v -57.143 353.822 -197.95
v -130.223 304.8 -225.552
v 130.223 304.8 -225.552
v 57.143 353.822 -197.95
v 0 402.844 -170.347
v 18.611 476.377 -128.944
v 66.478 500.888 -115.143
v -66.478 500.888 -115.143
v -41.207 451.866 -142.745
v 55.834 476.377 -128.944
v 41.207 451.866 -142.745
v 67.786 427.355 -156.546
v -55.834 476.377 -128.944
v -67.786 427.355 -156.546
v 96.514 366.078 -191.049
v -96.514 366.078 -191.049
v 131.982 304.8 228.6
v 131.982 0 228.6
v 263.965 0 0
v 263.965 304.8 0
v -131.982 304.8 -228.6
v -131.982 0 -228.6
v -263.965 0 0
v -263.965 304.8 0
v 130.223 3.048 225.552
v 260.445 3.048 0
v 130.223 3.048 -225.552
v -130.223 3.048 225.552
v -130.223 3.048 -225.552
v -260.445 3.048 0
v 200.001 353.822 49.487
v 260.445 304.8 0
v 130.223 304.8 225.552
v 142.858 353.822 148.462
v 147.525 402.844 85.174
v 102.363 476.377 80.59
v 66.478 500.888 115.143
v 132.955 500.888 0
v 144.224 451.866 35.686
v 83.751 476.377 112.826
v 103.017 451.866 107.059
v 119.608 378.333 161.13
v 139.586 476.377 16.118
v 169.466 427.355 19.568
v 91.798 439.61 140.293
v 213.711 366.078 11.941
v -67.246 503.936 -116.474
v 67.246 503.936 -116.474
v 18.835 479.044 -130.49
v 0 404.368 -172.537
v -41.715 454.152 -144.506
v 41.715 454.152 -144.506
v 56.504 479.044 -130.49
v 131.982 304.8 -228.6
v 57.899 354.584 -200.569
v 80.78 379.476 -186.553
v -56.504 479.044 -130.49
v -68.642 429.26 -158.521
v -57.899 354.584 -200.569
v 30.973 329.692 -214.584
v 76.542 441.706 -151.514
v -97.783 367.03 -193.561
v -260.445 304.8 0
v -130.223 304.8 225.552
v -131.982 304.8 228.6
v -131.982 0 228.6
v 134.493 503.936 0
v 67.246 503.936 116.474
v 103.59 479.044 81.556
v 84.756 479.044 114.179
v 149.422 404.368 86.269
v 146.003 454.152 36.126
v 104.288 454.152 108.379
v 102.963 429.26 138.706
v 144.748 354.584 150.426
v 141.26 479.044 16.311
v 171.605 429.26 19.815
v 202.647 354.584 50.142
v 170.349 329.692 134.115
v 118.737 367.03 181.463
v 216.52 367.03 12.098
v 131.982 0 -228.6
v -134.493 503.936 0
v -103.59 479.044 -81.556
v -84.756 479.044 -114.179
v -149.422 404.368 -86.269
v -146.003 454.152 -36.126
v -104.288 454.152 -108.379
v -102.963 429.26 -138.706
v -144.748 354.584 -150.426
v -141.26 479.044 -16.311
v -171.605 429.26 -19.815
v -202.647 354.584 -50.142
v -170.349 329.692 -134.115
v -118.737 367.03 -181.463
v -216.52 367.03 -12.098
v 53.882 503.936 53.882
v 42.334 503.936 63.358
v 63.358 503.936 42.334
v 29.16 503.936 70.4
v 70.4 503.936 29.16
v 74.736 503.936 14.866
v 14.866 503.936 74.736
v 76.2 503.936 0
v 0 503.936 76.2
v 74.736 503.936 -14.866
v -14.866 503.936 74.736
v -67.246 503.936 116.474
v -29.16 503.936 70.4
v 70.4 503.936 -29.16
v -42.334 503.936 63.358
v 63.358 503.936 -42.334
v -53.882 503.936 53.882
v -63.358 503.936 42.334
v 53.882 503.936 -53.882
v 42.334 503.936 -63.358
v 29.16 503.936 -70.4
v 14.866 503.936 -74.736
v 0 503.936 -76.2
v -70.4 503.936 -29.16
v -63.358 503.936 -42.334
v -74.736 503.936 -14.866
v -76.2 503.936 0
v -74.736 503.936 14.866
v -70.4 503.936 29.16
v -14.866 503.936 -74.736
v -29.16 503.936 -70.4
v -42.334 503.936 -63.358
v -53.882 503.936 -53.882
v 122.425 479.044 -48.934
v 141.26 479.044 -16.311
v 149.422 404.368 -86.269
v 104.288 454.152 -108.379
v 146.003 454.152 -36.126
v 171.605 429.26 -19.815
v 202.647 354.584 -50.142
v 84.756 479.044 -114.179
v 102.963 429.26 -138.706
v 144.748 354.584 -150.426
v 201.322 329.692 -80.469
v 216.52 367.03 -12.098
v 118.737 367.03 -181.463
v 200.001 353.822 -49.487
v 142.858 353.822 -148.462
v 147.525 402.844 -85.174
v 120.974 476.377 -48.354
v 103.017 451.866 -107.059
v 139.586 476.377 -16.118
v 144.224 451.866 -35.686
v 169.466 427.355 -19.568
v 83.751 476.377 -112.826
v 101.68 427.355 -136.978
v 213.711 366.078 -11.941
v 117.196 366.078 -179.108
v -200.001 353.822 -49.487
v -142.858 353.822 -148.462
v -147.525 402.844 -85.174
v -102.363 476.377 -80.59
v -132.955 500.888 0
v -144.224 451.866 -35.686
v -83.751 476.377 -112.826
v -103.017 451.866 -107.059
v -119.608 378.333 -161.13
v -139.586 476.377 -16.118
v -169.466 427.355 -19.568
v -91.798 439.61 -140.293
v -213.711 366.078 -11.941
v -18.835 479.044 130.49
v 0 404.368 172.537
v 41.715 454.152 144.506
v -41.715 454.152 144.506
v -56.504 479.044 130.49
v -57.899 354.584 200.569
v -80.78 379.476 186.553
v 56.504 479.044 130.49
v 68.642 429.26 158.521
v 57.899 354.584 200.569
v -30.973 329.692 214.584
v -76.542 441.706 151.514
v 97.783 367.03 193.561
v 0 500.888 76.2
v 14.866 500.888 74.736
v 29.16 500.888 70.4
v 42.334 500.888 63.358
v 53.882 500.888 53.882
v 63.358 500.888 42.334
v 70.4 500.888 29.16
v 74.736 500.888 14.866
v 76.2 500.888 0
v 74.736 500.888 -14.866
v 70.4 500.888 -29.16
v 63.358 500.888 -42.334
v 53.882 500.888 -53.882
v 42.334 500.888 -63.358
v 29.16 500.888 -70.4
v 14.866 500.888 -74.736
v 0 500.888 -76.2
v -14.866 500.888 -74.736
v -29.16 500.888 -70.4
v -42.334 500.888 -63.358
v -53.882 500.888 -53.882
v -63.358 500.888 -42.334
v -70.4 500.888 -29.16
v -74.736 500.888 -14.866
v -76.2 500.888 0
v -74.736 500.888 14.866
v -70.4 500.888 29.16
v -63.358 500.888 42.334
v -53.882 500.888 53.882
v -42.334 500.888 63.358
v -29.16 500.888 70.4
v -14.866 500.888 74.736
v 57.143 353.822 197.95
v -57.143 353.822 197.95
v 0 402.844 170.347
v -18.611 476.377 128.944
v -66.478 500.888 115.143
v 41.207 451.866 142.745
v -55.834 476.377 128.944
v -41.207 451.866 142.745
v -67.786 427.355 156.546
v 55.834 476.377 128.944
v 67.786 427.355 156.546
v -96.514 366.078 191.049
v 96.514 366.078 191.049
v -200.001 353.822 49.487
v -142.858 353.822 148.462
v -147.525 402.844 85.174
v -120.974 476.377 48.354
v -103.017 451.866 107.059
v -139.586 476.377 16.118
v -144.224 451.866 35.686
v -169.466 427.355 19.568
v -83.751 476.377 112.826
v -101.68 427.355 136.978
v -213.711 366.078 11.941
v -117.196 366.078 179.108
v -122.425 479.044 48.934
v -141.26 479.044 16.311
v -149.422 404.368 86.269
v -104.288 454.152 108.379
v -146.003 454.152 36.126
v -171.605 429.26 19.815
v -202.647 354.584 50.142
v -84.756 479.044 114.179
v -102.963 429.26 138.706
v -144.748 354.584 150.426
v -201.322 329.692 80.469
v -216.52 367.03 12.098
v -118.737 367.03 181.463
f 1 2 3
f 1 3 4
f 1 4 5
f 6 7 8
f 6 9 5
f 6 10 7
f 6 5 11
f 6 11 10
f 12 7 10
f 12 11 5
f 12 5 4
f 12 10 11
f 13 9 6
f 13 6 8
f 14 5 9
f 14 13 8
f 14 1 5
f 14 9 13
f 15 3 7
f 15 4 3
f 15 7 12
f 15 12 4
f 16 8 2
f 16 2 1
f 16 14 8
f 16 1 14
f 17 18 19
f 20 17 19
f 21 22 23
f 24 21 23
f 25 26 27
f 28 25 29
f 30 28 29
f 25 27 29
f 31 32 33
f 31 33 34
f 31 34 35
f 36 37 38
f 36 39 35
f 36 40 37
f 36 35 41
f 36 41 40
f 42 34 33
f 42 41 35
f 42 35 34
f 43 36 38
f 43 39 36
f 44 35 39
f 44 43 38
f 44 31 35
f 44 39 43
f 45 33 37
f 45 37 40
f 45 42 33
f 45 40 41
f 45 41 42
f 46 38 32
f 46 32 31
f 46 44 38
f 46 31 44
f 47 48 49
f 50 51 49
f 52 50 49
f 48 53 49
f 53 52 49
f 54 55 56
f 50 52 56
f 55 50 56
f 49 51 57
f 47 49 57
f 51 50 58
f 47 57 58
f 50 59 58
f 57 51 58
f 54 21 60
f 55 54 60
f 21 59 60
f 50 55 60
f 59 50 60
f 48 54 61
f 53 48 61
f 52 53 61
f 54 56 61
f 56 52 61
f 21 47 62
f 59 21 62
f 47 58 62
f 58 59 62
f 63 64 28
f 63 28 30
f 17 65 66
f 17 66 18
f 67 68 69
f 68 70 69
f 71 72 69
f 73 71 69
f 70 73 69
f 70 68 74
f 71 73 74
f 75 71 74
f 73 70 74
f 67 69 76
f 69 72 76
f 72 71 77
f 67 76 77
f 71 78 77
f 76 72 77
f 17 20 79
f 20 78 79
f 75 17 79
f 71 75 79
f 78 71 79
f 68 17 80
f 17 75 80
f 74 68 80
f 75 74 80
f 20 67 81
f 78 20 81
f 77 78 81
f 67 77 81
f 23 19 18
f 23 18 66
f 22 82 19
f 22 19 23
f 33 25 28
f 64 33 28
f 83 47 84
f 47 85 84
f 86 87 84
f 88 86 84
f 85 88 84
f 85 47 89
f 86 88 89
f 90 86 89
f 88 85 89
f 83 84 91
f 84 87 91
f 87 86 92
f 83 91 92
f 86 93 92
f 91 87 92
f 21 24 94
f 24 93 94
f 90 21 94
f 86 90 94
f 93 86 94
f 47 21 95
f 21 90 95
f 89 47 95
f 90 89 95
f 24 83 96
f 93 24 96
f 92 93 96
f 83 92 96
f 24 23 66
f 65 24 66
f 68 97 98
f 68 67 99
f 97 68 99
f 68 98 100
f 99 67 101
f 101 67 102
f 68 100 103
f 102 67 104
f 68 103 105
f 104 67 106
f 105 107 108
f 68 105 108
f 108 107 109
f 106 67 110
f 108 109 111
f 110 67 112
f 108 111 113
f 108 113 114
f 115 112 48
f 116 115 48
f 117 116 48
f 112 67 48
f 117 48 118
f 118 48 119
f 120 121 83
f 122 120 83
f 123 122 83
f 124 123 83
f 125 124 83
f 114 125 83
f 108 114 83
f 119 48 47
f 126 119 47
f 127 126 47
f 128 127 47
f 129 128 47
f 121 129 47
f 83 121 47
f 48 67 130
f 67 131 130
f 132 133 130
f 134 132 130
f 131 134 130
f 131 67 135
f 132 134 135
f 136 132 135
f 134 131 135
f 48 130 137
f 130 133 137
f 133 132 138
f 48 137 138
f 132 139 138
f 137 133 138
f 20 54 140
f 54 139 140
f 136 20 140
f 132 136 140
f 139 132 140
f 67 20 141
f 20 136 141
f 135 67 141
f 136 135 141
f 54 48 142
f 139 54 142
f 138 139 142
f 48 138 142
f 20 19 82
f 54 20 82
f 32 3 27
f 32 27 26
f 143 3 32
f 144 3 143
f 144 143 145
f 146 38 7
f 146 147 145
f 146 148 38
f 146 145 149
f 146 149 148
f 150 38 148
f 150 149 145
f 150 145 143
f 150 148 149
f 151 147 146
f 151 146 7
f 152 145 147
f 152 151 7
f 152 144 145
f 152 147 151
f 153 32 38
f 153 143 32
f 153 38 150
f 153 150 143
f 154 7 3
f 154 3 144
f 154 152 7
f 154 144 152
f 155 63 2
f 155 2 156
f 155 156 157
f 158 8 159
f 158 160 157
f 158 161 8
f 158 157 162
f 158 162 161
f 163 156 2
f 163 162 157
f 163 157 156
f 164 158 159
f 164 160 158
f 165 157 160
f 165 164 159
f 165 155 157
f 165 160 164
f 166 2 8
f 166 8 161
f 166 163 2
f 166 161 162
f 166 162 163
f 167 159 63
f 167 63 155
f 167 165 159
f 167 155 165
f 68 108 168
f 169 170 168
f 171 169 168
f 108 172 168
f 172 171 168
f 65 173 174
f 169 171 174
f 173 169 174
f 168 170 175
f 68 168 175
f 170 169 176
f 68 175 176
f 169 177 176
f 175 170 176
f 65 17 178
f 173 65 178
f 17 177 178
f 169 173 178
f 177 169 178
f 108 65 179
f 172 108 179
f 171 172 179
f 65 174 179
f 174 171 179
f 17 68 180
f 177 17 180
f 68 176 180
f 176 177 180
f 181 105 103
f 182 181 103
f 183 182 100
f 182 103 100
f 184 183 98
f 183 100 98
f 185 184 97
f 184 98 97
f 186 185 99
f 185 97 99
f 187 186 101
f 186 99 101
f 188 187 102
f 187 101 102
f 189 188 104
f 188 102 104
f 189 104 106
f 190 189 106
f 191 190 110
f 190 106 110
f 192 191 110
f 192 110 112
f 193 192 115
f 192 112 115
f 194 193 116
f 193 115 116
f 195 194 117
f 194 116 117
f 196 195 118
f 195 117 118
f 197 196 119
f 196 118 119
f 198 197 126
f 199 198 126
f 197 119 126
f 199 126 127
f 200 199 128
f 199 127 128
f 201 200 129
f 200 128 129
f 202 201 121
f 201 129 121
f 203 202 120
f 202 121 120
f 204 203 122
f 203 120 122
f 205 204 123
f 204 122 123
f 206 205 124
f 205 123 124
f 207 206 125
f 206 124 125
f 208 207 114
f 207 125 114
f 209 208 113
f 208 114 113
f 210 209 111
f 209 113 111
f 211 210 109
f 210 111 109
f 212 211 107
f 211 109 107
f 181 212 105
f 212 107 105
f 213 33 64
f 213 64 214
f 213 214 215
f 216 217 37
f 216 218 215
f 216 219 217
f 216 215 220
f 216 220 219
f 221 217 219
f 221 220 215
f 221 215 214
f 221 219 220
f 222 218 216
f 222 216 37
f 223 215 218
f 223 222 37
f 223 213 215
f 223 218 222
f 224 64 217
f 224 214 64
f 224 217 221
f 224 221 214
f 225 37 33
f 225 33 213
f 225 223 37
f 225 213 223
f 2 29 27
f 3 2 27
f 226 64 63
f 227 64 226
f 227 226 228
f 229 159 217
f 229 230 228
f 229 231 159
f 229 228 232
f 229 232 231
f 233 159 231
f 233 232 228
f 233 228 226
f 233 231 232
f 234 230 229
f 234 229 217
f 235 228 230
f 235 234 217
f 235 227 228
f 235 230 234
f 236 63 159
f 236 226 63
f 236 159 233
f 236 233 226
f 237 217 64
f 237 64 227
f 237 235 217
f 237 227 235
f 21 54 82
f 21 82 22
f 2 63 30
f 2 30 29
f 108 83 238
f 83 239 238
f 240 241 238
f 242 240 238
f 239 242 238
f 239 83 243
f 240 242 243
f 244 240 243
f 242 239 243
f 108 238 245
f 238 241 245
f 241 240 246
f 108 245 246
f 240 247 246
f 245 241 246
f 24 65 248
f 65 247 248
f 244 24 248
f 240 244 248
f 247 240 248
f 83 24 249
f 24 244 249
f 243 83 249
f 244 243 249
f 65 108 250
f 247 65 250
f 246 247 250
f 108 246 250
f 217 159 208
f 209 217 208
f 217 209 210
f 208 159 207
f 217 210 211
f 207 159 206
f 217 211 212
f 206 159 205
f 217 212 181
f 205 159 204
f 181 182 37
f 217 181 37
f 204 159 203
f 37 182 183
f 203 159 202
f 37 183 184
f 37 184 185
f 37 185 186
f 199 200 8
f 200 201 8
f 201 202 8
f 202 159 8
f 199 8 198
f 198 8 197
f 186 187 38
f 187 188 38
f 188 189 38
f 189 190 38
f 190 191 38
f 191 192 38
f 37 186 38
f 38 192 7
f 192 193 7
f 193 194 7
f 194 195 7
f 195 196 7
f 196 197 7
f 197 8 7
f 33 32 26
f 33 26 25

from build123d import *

# Parameters (mm, degrees)
BOSS_EXTRUDE2_DEPTH = 304.8
CUT_EXTRUDE1_DEPTH  = 304.8
BOSS_EXTRUDE3_DEPTH = 3.048
SKETCH11_R          = 76.2
CUT_EXTRUDE2_DEPTH  = 3.048
BOSS_EXTRUDE4_DEPTH = 3.048


with BuildPart() as part:
    # Sketch4 → Boss-Extrude2 (new body)
    with BuildSketch(Plane(origin=(0, 0, 0), x_dir=(1, 0, 0), z_dir=(0, 1, 0))):
        Polygon((263.964543073, 0), (131.982271537, 228.6), (-131.982271537, 228.6), (-263.964543073, 0), (-131.982271537, -228.6), (131.982271537, -228.6), align=None)
    extrude(amount=BOSS_EXTRUDE2_DEPTH)

    # Sketch5 → section 0 of loft1
    with BuildSketch(Plane(origin=(0, 503.936, 0), x_dir=(1, 0, 0), z_dir=(0, 1, 0)), mode=Mode.PRIVATE) as loft1_s0:
        with BuildLine():
            Line((134.493, 0), (67.2465, 116.474354631))
            Line((67.2465, 116.474354631), (-67.2465, 116.474354631))
            Line((-67.2465, 116.474354631), (-134.493, 0))
            Line((-134.493, 0), (-67.2465, -116.474354631))
            Line((-67.2465, -116.474354631), (67.2465, -116.474354631))
            Line((67.2465, -116.474354631), (134.493, 0))
        make_face()
    # loft up to a face of the part (loft1)
    loft([loft1_s0.sketch, part.faces().sort_by_distance((0, 304.8, 0))[0]])

    # Sketch7 → Cut-Extrude1 (cut)
    with BuildSketch(Plane(origin=(0, 0, 0), x_dir=(-1, 0, 0), z_dir=(0, -1, 0))):
        Polygon((-260.445015833, 0), (-130.222507916, -225.552), (130.222507916, -225.552), (260.445015833, 0), (130.222507916, 225.552), (-130.222507916, 225.552), align=None)
    extrude(amount=-CUT_EXTRUDE1_DEPTH, mode=Mode.SUBTRACT)

    # Sketch8 → section 0 of cut_loft2
    with BuildSketch(Plane(origin=(0, 503.936, 0), x_dir=(1, 0, 0), z_dir=(0, 1, 0)), mode=Mode.PRIVATE) as cut_loft2_s0:
        with BuildLine():
            Line((130.973472817, 0), (65.486736408, 113.426354681))
            Line((65.486736408, 113.426354681), (-65.486736408, 113.426354681))
            Line((-65.486736408, 113.426354681), (-130.973472817, 0))
            Line((-130.973472817, 0), (-65.486736408, -113.426354681))
            Line((-65.486736408, -113.426354681), (65.486736408, -113.426354681))
            Line((65.486736408, -113.426354681), (130.973472817, 0))
        make_face()
    # loft up to a face of the part (cut_loft2)
    loft([cut_loft2_s0.sketch, part.faces().sort_by_distance((0, 304.8, 0))[0]], mode=Mode.SUBTRACT)

    # Sketch10 → Boss-Extrude3 (add)
    with BuildSketch(Plane(origin=(0, 503.936, 0), x_dir=(1, 0, 0), z_dir=(0, 1, 0))):
        Polygon((134.493, 0), (67.2465, 116.474354631), (-67.2465, 116.474354631), (-134.493, 0), (-67.2465, -116.474354631), (67.2465, -116.474354631), align=None)
    extrude(amount=-BOSS_EXTRUDE3_DEPTH)

    # Sketch11 → Cut-Extrude2 (cut)
    with BuildSketch(Plane(origin=(0, 503.936, 0), x_dir=(1, 0, 0), z_dir=(0, 1, 0))):
        with Locations(Location((0, 0, 0), (0, 0, 270))):
            Circle(SKETCH11_R)
    extrude(amount=-CUT_EXTRUDE2_DEPTH, mode=Mode.SUBTRACT)

    # Sketch13 → Boss-Extrude4 (add)
    with BuildSketch(Plane(origin=(0, 0, 0), x_dir=(-1, 0, 0), z_dir=(0, -1, 0))):
        Polygon((-260.445015833, 0), (-130.222507916, -225.552), (130.222507916, -225.552), (260.445015833, 0), (130.222507916, 225.552), (-130.222507916, 225.552), align=None)
    extrude(amount=-BOSS_EXTRUDE4_DEPTH)


solid = part.part
